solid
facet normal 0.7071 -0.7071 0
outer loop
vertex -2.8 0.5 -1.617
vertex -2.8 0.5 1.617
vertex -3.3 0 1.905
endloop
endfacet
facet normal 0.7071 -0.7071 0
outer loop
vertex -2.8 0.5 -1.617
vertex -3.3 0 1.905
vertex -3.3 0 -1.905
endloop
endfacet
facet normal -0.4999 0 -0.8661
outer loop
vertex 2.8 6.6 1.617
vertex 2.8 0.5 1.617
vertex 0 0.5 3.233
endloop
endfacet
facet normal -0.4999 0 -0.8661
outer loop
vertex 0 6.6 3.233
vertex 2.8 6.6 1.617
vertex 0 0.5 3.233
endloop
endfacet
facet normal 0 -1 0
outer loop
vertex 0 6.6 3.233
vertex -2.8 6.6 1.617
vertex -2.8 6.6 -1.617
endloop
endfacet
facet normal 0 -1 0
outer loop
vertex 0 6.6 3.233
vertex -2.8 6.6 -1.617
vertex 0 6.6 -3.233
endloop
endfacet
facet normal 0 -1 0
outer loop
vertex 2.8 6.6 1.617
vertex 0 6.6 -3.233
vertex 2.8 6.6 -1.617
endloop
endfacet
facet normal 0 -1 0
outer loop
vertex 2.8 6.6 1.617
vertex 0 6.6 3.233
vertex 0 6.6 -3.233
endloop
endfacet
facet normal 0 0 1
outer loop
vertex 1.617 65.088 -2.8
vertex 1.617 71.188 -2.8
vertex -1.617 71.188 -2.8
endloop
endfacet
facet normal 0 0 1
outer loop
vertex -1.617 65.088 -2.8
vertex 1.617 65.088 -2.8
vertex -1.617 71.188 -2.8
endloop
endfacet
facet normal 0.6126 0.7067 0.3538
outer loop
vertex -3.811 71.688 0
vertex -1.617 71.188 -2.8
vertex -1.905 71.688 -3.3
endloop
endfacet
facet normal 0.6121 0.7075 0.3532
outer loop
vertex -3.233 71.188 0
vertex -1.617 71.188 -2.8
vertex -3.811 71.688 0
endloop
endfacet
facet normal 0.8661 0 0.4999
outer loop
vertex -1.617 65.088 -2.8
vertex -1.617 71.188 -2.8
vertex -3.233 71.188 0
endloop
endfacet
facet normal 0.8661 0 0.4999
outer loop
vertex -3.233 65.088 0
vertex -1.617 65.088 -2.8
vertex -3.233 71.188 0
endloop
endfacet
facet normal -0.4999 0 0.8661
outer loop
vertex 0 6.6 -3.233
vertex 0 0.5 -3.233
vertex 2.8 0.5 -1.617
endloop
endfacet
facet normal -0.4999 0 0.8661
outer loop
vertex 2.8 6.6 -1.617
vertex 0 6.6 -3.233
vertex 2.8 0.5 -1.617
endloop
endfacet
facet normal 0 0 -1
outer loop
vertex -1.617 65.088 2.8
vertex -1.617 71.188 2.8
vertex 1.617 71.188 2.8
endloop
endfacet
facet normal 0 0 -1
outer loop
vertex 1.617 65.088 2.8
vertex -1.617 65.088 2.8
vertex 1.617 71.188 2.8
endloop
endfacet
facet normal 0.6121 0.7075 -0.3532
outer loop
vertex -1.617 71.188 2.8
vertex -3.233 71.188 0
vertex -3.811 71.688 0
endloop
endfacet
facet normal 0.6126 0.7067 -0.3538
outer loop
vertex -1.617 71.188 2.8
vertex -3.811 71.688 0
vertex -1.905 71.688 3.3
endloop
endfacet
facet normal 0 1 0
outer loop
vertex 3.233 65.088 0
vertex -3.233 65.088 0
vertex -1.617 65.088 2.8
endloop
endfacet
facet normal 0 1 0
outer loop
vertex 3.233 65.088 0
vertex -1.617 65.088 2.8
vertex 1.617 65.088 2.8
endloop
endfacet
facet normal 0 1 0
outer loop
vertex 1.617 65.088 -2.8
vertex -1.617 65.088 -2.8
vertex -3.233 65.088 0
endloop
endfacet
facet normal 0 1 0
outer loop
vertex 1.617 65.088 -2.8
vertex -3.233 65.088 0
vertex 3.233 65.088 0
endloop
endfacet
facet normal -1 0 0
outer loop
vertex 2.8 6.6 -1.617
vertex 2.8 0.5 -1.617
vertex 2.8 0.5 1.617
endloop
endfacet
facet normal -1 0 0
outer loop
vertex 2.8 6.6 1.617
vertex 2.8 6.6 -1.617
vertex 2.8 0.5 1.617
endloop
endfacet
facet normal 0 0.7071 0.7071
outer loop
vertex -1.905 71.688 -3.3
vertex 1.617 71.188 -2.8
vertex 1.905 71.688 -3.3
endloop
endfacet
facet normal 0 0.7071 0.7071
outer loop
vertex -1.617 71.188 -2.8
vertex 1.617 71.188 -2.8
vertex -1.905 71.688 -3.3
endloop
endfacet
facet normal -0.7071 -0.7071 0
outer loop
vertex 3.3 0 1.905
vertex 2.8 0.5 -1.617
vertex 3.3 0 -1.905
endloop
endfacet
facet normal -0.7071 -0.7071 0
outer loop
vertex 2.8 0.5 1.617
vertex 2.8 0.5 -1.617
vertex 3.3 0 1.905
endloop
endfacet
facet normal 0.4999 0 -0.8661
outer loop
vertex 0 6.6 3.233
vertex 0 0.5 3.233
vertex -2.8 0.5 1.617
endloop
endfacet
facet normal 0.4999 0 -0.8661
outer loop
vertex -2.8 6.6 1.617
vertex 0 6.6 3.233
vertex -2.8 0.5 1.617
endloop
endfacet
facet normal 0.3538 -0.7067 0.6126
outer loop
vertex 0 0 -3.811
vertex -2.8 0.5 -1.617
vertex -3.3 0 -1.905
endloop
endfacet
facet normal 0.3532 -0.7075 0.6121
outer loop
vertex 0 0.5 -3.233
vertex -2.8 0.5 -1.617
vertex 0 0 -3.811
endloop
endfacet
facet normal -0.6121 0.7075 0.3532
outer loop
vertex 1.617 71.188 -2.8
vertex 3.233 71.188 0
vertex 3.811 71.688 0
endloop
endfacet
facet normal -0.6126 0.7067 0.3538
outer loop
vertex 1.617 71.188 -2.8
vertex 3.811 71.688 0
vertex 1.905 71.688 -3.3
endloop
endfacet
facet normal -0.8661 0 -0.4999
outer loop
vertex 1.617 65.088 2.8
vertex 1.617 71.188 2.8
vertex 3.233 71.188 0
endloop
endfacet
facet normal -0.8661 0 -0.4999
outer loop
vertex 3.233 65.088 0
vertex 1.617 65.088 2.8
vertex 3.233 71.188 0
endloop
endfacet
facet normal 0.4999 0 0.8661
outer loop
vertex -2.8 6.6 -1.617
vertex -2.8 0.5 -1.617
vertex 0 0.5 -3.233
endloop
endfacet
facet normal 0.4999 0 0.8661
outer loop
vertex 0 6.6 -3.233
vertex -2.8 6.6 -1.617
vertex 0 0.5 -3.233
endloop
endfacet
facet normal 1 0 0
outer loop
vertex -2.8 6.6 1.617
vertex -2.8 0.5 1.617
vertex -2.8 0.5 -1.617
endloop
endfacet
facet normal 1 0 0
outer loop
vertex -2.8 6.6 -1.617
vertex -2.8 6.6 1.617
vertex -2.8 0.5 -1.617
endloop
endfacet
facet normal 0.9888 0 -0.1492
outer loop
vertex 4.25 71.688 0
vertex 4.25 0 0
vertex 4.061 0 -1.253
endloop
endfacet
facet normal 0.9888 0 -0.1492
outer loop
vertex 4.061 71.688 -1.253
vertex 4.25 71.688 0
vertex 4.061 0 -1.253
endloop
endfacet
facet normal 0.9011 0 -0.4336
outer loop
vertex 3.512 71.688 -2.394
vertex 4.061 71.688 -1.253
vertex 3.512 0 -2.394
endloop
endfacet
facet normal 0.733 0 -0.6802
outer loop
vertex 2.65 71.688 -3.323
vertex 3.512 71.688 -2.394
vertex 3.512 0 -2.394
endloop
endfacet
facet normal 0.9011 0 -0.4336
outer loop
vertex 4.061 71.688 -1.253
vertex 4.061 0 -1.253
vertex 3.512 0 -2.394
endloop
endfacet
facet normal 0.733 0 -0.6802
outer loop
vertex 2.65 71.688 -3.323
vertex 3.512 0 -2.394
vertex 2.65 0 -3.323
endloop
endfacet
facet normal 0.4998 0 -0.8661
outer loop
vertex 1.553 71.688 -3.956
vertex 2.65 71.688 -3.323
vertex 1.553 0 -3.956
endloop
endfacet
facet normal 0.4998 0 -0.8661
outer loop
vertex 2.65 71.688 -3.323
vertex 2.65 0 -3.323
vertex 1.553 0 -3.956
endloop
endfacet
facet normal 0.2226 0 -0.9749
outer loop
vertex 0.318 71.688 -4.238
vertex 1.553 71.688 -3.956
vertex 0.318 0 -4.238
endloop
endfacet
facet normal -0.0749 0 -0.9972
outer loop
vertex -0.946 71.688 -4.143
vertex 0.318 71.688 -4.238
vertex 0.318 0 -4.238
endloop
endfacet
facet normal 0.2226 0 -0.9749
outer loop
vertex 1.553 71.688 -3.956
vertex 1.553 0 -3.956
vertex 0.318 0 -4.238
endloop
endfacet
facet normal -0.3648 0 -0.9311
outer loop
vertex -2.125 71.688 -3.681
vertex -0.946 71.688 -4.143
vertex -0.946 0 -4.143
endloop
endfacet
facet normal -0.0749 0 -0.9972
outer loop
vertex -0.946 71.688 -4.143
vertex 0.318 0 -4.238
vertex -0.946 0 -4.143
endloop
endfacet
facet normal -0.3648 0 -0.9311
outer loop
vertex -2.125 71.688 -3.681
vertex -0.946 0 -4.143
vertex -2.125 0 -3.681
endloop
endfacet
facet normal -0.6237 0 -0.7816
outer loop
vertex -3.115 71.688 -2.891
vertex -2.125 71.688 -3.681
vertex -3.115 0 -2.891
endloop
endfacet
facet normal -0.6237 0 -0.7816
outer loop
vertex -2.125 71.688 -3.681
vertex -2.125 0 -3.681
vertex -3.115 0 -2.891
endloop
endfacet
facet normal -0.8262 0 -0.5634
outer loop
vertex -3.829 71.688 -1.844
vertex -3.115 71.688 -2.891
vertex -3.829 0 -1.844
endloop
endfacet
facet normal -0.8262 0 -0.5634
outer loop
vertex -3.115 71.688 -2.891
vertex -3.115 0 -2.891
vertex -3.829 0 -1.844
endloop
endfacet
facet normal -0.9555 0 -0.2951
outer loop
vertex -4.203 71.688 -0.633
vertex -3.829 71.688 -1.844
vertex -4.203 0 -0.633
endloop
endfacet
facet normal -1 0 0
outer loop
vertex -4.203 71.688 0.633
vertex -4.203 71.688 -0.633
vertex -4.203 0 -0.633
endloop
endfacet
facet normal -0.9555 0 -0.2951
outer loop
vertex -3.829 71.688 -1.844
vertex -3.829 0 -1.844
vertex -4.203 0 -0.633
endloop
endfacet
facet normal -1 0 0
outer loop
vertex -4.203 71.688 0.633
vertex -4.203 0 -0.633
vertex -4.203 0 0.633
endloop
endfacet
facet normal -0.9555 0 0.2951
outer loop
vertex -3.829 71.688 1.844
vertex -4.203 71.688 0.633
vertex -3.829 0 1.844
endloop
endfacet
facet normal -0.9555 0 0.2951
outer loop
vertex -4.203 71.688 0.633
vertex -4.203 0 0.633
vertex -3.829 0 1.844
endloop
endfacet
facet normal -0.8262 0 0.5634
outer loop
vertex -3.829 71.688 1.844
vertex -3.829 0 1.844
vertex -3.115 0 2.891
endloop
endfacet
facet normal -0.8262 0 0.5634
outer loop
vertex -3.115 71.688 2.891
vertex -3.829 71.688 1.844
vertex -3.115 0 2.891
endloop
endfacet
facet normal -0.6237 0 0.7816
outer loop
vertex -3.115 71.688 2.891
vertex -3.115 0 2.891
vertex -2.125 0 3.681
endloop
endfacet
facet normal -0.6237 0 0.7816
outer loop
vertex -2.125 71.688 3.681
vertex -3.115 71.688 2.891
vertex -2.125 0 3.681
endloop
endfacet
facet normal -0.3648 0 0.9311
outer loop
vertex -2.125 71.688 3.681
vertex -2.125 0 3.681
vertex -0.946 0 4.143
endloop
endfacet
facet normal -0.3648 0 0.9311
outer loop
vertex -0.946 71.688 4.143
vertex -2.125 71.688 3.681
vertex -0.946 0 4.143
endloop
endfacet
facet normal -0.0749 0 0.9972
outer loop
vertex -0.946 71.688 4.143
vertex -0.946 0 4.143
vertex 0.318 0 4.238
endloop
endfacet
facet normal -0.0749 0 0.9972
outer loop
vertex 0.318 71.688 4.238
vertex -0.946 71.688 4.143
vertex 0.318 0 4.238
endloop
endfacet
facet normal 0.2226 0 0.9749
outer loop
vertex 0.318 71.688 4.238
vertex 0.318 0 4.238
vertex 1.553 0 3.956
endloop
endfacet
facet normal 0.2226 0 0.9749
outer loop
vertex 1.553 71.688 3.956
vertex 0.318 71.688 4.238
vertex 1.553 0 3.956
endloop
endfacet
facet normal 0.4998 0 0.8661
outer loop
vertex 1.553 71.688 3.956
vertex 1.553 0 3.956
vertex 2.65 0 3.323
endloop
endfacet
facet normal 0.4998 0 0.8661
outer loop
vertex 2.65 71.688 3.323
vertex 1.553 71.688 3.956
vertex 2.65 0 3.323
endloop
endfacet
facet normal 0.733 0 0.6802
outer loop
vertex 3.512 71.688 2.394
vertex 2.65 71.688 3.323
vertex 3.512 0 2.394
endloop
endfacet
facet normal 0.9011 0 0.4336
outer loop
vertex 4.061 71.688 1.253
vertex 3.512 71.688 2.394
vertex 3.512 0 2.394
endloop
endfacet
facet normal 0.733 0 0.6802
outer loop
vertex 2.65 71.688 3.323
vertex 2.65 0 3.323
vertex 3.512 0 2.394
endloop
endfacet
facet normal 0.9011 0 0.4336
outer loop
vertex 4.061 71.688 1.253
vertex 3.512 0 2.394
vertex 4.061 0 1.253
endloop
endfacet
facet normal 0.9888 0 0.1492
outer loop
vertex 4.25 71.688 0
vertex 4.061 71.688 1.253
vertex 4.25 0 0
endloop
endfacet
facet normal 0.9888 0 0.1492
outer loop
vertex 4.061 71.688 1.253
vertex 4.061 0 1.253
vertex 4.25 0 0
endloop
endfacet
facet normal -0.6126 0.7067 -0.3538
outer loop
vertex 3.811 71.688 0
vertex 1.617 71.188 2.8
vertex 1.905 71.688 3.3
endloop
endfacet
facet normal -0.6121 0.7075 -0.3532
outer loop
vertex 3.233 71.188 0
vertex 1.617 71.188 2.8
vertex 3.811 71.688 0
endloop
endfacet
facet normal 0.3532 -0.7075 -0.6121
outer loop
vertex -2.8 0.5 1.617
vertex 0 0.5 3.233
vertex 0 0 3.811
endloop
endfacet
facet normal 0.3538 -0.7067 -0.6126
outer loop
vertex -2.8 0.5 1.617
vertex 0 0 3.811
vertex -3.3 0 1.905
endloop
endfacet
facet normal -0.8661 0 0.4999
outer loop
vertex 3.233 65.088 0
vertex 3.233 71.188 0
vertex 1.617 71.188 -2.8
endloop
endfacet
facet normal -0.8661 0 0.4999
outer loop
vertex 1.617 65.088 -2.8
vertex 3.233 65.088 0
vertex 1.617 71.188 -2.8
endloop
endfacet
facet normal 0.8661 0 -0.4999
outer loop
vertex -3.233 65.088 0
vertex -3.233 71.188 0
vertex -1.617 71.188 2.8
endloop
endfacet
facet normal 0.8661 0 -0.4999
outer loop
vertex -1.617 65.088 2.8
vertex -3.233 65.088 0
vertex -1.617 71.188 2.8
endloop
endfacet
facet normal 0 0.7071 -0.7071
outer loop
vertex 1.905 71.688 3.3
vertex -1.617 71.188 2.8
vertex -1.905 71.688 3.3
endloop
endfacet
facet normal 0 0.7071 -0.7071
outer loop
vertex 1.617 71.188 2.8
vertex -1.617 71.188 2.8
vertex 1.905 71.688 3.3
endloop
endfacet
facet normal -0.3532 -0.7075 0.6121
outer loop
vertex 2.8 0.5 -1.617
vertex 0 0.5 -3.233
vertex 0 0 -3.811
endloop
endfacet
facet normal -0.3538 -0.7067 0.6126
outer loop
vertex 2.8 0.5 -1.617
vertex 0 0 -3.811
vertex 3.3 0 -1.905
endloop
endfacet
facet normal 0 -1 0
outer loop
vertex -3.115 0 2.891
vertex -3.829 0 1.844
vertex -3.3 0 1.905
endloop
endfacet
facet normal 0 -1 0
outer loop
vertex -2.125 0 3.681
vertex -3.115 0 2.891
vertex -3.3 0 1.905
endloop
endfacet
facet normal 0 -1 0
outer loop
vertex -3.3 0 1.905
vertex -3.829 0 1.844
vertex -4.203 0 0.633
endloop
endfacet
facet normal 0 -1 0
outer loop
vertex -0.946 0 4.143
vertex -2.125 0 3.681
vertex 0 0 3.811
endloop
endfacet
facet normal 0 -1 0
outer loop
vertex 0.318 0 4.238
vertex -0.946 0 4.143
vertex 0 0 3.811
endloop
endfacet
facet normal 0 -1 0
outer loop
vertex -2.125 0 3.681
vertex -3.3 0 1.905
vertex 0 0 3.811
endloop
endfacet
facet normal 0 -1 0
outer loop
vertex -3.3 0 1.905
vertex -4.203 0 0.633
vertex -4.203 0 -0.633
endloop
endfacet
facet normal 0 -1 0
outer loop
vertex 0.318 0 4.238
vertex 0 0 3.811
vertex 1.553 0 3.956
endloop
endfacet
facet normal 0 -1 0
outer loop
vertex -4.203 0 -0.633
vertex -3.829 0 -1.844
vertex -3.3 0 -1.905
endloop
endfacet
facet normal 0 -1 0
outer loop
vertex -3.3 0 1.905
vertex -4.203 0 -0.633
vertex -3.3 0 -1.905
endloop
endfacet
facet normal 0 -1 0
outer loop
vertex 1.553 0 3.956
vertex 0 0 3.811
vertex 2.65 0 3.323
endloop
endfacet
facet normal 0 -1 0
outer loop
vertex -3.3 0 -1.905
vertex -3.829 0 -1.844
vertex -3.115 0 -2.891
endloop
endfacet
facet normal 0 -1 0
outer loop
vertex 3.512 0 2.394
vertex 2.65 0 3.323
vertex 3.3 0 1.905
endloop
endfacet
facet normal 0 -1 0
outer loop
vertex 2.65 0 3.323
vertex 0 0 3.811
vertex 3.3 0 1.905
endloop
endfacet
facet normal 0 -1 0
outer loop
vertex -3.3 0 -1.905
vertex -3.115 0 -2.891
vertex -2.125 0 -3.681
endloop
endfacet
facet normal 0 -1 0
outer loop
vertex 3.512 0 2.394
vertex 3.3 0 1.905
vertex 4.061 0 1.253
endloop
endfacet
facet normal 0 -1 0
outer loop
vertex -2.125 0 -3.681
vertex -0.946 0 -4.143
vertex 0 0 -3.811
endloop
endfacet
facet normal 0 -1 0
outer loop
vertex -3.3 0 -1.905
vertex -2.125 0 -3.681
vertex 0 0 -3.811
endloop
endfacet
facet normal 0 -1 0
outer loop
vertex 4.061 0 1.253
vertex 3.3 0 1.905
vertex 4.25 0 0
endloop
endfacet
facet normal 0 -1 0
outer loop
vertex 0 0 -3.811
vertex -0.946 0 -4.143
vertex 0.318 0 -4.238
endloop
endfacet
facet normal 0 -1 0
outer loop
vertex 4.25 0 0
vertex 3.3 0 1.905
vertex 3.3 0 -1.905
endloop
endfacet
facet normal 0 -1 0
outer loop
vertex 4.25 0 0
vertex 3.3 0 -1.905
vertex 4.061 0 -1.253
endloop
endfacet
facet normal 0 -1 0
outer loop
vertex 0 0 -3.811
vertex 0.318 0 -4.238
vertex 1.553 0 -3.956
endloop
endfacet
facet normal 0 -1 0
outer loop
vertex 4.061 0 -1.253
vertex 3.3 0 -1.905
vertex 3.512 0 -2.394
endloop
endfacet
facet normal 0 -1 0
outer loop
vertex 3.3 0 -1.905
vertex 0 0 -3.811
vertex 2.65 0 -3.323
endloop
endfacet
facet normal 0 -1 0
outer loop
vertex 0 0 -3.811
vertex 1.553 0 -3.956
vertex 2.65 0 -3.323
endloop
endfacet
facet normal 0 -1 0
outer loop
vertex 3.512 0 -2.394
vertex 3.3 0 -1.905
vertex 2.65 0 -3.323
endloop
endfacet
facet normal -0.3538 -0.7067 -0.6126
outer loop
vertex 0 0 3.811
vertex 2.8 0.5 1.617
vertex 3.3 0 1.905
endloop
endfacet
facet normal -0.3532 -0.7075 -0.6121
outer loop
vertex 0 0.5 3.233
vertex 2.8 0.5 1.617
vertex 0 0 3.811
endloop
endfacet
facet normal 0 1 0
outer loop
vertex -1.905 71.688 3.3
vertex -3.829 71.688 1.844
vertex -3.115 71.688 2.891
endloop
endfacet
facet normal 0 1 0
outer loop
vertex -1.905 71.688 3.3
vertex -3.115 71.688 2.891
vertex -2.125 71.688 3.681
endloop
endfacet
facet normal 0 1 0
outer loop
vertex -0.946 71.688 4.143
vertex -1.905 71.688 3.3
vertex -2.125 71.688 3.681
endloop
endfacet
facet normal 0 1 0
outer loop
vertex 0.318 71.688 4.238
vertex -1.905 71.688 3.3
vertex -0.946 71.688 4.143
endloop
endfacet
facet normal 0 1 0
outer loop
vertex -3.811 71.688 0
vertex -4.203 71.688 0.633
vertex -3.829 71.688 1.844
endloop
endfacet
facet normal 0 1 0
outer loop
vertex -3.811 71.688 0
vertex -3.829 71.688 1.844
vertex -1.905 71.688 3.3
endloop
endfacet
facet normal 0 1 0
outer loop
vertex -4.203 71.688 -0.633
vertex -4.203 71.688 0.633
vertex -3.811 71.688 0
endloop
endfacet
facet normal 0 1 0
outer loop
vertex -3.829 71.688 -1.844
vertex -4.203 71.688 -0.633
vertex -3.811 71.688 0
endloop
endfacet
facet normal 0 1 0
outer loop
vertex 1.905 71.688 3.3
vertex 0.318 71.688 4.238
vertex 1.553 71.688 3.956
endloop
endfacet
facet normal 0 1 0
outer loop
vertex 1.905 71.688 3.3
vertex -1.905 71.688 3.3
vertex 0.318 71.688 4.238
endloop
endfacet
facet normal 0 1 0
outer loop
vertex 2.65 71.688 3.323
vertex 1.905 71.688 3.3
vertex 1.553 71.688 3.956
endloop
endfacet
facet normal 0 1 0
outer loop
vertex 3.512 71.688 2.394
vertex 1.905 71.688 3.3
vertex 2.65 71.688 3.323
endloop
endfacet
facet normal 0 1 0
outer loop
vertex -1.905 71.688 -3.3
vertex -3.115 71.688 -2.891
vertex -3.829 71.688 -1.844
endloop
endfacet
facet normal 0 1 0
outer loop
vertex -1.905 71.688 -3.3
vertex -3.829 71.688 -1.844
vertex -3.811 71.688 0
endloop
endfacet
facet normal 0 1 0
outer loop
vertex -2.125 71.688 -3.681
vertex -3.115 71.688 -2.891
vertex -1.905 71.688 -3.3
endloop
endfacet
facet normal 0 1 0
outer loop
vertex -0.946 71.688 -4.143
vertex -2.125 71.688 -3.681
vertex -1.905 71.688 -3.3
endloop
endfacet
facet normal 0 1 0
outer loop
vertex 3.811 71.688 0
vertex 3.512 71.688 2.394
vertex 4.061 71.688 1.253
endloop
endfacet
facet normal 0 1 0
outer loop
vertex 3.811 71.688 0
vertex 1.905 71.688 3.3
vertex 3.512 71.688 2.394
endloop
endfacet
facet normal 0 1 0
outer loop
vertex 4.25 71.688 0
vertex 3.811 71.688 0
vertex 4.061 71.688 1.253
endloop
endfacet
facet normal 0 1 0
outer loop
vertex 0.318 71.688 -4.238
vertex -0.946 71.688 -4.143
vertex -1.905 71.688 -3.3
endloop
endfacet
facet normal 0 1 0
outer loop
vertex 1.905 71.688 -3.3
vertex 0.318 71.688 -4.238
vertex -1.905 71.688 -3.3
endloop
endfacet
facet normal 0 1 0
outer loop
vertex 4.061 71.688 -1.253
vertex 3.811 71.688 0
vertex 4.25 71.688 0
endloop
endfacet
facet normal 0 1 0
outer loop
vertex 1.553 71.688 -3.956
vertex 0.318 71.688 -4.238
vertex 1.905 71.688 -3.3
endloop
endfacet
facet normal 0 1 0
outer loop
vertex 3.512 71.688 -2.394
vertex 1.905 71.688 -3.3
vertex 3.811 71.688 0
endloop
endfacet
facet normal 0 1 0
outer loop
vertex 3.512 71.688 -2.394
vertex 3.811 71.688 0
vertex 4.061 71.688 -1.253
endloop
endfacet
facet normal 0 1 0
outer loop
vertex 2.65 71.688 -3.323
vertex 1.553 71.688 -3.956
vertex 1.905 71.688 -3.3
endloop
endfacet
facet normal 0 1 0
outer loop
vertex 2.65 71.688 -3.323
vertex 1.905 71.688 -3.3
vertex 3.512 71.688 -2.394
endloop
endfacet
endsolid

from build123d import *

# Parameters (mm, degrees)
SKETCH1_R           = 4.25
BOSS_EXTRUDE1_DEPTH = 71.68750559
CUT_EXTRUDE1_DEPTH  = 6.6
CHAMFER1_SIZE       = 0.5
CUT_EXTRUDE2_DEPTH  = 6.6
CHAMFER2_SIZE       = 0.5


with BuildPart() as part:
    # Sketch1 → Boss-Extrude1 (new body)
    with BuildSketch(Plane(origin=(0, 0, 0), x_dir=(1, 0, 0), z_dir=(0, 1, 0))):
        Circle(SKETCH1_R)
    extrude(amount=BOSS_EXTRUDE1_DEPTH)

    # Sketch2 → Cut-Extrude1 (cut)
    with BuildSketch(Plane(origin=(0, 71.68750559, 0), x_dir=(1, 0, 0), z_dir=(0, 1, 0))):
        Polygon((1.616580754, 2.8), (-1.616580754, 2.8), (-3.233161507, 0), (-1.616580754, -2.8), (1.616580754, -2.8), (3.233161507, 0), align=None)
    extrude(amount=-CUT_EXTRUDE1_DEPTH, mode=Mode.SUBTRACT)

    # Chamfer1
    chamfer1_edges = [part.edges().sort_by_distance(p)[0] for p in [
        (2.424871131, 71.68750559, -1.4),
        (0, 71.68750559, -2.8),
        (-2.424871131, 71.68750559, -1.4),
        (-2.424871131, 71.68750559, 1.4),
        (0, 71.68750559, 2.8),
        (2.424871131, 71.68750559, 1.4),
    ]]
    chamfer(chamfer1_edges, length=CHAMFER1_SIZE)

    # Sketch3 → Cut-Extrude2 (cut)
    with BuildSketch(Plane.XZ):
        Polygon((0, 3.233161507), (-2.8, 1.616580754), (-2.8, -1.616580754), (0, -3.233161507), (2.8, -1.616580754), (2.8, 1.616580754), align=None)
    extrude(amount=-CUT_EXTRUDE2_DEPTH, mode=Mode.SUBTRACT)

    # Chamfer2
    chamfer2_edges = [part.edges().sort_by_distance(p)[0] for p in [
        (1.4, 0, 2.424871131),
        (-1.4, 0, 2.424871131),
        (-2.8, 0, 0),
        (-1.4, 0, -2.424871131),
        (1.4, 0, -2.424871131),
        (2.8, 0, 0),
    ]]
    chamfer(chamfer2_edges, length=CHAMFER2_SIZE)


solid = part.part
